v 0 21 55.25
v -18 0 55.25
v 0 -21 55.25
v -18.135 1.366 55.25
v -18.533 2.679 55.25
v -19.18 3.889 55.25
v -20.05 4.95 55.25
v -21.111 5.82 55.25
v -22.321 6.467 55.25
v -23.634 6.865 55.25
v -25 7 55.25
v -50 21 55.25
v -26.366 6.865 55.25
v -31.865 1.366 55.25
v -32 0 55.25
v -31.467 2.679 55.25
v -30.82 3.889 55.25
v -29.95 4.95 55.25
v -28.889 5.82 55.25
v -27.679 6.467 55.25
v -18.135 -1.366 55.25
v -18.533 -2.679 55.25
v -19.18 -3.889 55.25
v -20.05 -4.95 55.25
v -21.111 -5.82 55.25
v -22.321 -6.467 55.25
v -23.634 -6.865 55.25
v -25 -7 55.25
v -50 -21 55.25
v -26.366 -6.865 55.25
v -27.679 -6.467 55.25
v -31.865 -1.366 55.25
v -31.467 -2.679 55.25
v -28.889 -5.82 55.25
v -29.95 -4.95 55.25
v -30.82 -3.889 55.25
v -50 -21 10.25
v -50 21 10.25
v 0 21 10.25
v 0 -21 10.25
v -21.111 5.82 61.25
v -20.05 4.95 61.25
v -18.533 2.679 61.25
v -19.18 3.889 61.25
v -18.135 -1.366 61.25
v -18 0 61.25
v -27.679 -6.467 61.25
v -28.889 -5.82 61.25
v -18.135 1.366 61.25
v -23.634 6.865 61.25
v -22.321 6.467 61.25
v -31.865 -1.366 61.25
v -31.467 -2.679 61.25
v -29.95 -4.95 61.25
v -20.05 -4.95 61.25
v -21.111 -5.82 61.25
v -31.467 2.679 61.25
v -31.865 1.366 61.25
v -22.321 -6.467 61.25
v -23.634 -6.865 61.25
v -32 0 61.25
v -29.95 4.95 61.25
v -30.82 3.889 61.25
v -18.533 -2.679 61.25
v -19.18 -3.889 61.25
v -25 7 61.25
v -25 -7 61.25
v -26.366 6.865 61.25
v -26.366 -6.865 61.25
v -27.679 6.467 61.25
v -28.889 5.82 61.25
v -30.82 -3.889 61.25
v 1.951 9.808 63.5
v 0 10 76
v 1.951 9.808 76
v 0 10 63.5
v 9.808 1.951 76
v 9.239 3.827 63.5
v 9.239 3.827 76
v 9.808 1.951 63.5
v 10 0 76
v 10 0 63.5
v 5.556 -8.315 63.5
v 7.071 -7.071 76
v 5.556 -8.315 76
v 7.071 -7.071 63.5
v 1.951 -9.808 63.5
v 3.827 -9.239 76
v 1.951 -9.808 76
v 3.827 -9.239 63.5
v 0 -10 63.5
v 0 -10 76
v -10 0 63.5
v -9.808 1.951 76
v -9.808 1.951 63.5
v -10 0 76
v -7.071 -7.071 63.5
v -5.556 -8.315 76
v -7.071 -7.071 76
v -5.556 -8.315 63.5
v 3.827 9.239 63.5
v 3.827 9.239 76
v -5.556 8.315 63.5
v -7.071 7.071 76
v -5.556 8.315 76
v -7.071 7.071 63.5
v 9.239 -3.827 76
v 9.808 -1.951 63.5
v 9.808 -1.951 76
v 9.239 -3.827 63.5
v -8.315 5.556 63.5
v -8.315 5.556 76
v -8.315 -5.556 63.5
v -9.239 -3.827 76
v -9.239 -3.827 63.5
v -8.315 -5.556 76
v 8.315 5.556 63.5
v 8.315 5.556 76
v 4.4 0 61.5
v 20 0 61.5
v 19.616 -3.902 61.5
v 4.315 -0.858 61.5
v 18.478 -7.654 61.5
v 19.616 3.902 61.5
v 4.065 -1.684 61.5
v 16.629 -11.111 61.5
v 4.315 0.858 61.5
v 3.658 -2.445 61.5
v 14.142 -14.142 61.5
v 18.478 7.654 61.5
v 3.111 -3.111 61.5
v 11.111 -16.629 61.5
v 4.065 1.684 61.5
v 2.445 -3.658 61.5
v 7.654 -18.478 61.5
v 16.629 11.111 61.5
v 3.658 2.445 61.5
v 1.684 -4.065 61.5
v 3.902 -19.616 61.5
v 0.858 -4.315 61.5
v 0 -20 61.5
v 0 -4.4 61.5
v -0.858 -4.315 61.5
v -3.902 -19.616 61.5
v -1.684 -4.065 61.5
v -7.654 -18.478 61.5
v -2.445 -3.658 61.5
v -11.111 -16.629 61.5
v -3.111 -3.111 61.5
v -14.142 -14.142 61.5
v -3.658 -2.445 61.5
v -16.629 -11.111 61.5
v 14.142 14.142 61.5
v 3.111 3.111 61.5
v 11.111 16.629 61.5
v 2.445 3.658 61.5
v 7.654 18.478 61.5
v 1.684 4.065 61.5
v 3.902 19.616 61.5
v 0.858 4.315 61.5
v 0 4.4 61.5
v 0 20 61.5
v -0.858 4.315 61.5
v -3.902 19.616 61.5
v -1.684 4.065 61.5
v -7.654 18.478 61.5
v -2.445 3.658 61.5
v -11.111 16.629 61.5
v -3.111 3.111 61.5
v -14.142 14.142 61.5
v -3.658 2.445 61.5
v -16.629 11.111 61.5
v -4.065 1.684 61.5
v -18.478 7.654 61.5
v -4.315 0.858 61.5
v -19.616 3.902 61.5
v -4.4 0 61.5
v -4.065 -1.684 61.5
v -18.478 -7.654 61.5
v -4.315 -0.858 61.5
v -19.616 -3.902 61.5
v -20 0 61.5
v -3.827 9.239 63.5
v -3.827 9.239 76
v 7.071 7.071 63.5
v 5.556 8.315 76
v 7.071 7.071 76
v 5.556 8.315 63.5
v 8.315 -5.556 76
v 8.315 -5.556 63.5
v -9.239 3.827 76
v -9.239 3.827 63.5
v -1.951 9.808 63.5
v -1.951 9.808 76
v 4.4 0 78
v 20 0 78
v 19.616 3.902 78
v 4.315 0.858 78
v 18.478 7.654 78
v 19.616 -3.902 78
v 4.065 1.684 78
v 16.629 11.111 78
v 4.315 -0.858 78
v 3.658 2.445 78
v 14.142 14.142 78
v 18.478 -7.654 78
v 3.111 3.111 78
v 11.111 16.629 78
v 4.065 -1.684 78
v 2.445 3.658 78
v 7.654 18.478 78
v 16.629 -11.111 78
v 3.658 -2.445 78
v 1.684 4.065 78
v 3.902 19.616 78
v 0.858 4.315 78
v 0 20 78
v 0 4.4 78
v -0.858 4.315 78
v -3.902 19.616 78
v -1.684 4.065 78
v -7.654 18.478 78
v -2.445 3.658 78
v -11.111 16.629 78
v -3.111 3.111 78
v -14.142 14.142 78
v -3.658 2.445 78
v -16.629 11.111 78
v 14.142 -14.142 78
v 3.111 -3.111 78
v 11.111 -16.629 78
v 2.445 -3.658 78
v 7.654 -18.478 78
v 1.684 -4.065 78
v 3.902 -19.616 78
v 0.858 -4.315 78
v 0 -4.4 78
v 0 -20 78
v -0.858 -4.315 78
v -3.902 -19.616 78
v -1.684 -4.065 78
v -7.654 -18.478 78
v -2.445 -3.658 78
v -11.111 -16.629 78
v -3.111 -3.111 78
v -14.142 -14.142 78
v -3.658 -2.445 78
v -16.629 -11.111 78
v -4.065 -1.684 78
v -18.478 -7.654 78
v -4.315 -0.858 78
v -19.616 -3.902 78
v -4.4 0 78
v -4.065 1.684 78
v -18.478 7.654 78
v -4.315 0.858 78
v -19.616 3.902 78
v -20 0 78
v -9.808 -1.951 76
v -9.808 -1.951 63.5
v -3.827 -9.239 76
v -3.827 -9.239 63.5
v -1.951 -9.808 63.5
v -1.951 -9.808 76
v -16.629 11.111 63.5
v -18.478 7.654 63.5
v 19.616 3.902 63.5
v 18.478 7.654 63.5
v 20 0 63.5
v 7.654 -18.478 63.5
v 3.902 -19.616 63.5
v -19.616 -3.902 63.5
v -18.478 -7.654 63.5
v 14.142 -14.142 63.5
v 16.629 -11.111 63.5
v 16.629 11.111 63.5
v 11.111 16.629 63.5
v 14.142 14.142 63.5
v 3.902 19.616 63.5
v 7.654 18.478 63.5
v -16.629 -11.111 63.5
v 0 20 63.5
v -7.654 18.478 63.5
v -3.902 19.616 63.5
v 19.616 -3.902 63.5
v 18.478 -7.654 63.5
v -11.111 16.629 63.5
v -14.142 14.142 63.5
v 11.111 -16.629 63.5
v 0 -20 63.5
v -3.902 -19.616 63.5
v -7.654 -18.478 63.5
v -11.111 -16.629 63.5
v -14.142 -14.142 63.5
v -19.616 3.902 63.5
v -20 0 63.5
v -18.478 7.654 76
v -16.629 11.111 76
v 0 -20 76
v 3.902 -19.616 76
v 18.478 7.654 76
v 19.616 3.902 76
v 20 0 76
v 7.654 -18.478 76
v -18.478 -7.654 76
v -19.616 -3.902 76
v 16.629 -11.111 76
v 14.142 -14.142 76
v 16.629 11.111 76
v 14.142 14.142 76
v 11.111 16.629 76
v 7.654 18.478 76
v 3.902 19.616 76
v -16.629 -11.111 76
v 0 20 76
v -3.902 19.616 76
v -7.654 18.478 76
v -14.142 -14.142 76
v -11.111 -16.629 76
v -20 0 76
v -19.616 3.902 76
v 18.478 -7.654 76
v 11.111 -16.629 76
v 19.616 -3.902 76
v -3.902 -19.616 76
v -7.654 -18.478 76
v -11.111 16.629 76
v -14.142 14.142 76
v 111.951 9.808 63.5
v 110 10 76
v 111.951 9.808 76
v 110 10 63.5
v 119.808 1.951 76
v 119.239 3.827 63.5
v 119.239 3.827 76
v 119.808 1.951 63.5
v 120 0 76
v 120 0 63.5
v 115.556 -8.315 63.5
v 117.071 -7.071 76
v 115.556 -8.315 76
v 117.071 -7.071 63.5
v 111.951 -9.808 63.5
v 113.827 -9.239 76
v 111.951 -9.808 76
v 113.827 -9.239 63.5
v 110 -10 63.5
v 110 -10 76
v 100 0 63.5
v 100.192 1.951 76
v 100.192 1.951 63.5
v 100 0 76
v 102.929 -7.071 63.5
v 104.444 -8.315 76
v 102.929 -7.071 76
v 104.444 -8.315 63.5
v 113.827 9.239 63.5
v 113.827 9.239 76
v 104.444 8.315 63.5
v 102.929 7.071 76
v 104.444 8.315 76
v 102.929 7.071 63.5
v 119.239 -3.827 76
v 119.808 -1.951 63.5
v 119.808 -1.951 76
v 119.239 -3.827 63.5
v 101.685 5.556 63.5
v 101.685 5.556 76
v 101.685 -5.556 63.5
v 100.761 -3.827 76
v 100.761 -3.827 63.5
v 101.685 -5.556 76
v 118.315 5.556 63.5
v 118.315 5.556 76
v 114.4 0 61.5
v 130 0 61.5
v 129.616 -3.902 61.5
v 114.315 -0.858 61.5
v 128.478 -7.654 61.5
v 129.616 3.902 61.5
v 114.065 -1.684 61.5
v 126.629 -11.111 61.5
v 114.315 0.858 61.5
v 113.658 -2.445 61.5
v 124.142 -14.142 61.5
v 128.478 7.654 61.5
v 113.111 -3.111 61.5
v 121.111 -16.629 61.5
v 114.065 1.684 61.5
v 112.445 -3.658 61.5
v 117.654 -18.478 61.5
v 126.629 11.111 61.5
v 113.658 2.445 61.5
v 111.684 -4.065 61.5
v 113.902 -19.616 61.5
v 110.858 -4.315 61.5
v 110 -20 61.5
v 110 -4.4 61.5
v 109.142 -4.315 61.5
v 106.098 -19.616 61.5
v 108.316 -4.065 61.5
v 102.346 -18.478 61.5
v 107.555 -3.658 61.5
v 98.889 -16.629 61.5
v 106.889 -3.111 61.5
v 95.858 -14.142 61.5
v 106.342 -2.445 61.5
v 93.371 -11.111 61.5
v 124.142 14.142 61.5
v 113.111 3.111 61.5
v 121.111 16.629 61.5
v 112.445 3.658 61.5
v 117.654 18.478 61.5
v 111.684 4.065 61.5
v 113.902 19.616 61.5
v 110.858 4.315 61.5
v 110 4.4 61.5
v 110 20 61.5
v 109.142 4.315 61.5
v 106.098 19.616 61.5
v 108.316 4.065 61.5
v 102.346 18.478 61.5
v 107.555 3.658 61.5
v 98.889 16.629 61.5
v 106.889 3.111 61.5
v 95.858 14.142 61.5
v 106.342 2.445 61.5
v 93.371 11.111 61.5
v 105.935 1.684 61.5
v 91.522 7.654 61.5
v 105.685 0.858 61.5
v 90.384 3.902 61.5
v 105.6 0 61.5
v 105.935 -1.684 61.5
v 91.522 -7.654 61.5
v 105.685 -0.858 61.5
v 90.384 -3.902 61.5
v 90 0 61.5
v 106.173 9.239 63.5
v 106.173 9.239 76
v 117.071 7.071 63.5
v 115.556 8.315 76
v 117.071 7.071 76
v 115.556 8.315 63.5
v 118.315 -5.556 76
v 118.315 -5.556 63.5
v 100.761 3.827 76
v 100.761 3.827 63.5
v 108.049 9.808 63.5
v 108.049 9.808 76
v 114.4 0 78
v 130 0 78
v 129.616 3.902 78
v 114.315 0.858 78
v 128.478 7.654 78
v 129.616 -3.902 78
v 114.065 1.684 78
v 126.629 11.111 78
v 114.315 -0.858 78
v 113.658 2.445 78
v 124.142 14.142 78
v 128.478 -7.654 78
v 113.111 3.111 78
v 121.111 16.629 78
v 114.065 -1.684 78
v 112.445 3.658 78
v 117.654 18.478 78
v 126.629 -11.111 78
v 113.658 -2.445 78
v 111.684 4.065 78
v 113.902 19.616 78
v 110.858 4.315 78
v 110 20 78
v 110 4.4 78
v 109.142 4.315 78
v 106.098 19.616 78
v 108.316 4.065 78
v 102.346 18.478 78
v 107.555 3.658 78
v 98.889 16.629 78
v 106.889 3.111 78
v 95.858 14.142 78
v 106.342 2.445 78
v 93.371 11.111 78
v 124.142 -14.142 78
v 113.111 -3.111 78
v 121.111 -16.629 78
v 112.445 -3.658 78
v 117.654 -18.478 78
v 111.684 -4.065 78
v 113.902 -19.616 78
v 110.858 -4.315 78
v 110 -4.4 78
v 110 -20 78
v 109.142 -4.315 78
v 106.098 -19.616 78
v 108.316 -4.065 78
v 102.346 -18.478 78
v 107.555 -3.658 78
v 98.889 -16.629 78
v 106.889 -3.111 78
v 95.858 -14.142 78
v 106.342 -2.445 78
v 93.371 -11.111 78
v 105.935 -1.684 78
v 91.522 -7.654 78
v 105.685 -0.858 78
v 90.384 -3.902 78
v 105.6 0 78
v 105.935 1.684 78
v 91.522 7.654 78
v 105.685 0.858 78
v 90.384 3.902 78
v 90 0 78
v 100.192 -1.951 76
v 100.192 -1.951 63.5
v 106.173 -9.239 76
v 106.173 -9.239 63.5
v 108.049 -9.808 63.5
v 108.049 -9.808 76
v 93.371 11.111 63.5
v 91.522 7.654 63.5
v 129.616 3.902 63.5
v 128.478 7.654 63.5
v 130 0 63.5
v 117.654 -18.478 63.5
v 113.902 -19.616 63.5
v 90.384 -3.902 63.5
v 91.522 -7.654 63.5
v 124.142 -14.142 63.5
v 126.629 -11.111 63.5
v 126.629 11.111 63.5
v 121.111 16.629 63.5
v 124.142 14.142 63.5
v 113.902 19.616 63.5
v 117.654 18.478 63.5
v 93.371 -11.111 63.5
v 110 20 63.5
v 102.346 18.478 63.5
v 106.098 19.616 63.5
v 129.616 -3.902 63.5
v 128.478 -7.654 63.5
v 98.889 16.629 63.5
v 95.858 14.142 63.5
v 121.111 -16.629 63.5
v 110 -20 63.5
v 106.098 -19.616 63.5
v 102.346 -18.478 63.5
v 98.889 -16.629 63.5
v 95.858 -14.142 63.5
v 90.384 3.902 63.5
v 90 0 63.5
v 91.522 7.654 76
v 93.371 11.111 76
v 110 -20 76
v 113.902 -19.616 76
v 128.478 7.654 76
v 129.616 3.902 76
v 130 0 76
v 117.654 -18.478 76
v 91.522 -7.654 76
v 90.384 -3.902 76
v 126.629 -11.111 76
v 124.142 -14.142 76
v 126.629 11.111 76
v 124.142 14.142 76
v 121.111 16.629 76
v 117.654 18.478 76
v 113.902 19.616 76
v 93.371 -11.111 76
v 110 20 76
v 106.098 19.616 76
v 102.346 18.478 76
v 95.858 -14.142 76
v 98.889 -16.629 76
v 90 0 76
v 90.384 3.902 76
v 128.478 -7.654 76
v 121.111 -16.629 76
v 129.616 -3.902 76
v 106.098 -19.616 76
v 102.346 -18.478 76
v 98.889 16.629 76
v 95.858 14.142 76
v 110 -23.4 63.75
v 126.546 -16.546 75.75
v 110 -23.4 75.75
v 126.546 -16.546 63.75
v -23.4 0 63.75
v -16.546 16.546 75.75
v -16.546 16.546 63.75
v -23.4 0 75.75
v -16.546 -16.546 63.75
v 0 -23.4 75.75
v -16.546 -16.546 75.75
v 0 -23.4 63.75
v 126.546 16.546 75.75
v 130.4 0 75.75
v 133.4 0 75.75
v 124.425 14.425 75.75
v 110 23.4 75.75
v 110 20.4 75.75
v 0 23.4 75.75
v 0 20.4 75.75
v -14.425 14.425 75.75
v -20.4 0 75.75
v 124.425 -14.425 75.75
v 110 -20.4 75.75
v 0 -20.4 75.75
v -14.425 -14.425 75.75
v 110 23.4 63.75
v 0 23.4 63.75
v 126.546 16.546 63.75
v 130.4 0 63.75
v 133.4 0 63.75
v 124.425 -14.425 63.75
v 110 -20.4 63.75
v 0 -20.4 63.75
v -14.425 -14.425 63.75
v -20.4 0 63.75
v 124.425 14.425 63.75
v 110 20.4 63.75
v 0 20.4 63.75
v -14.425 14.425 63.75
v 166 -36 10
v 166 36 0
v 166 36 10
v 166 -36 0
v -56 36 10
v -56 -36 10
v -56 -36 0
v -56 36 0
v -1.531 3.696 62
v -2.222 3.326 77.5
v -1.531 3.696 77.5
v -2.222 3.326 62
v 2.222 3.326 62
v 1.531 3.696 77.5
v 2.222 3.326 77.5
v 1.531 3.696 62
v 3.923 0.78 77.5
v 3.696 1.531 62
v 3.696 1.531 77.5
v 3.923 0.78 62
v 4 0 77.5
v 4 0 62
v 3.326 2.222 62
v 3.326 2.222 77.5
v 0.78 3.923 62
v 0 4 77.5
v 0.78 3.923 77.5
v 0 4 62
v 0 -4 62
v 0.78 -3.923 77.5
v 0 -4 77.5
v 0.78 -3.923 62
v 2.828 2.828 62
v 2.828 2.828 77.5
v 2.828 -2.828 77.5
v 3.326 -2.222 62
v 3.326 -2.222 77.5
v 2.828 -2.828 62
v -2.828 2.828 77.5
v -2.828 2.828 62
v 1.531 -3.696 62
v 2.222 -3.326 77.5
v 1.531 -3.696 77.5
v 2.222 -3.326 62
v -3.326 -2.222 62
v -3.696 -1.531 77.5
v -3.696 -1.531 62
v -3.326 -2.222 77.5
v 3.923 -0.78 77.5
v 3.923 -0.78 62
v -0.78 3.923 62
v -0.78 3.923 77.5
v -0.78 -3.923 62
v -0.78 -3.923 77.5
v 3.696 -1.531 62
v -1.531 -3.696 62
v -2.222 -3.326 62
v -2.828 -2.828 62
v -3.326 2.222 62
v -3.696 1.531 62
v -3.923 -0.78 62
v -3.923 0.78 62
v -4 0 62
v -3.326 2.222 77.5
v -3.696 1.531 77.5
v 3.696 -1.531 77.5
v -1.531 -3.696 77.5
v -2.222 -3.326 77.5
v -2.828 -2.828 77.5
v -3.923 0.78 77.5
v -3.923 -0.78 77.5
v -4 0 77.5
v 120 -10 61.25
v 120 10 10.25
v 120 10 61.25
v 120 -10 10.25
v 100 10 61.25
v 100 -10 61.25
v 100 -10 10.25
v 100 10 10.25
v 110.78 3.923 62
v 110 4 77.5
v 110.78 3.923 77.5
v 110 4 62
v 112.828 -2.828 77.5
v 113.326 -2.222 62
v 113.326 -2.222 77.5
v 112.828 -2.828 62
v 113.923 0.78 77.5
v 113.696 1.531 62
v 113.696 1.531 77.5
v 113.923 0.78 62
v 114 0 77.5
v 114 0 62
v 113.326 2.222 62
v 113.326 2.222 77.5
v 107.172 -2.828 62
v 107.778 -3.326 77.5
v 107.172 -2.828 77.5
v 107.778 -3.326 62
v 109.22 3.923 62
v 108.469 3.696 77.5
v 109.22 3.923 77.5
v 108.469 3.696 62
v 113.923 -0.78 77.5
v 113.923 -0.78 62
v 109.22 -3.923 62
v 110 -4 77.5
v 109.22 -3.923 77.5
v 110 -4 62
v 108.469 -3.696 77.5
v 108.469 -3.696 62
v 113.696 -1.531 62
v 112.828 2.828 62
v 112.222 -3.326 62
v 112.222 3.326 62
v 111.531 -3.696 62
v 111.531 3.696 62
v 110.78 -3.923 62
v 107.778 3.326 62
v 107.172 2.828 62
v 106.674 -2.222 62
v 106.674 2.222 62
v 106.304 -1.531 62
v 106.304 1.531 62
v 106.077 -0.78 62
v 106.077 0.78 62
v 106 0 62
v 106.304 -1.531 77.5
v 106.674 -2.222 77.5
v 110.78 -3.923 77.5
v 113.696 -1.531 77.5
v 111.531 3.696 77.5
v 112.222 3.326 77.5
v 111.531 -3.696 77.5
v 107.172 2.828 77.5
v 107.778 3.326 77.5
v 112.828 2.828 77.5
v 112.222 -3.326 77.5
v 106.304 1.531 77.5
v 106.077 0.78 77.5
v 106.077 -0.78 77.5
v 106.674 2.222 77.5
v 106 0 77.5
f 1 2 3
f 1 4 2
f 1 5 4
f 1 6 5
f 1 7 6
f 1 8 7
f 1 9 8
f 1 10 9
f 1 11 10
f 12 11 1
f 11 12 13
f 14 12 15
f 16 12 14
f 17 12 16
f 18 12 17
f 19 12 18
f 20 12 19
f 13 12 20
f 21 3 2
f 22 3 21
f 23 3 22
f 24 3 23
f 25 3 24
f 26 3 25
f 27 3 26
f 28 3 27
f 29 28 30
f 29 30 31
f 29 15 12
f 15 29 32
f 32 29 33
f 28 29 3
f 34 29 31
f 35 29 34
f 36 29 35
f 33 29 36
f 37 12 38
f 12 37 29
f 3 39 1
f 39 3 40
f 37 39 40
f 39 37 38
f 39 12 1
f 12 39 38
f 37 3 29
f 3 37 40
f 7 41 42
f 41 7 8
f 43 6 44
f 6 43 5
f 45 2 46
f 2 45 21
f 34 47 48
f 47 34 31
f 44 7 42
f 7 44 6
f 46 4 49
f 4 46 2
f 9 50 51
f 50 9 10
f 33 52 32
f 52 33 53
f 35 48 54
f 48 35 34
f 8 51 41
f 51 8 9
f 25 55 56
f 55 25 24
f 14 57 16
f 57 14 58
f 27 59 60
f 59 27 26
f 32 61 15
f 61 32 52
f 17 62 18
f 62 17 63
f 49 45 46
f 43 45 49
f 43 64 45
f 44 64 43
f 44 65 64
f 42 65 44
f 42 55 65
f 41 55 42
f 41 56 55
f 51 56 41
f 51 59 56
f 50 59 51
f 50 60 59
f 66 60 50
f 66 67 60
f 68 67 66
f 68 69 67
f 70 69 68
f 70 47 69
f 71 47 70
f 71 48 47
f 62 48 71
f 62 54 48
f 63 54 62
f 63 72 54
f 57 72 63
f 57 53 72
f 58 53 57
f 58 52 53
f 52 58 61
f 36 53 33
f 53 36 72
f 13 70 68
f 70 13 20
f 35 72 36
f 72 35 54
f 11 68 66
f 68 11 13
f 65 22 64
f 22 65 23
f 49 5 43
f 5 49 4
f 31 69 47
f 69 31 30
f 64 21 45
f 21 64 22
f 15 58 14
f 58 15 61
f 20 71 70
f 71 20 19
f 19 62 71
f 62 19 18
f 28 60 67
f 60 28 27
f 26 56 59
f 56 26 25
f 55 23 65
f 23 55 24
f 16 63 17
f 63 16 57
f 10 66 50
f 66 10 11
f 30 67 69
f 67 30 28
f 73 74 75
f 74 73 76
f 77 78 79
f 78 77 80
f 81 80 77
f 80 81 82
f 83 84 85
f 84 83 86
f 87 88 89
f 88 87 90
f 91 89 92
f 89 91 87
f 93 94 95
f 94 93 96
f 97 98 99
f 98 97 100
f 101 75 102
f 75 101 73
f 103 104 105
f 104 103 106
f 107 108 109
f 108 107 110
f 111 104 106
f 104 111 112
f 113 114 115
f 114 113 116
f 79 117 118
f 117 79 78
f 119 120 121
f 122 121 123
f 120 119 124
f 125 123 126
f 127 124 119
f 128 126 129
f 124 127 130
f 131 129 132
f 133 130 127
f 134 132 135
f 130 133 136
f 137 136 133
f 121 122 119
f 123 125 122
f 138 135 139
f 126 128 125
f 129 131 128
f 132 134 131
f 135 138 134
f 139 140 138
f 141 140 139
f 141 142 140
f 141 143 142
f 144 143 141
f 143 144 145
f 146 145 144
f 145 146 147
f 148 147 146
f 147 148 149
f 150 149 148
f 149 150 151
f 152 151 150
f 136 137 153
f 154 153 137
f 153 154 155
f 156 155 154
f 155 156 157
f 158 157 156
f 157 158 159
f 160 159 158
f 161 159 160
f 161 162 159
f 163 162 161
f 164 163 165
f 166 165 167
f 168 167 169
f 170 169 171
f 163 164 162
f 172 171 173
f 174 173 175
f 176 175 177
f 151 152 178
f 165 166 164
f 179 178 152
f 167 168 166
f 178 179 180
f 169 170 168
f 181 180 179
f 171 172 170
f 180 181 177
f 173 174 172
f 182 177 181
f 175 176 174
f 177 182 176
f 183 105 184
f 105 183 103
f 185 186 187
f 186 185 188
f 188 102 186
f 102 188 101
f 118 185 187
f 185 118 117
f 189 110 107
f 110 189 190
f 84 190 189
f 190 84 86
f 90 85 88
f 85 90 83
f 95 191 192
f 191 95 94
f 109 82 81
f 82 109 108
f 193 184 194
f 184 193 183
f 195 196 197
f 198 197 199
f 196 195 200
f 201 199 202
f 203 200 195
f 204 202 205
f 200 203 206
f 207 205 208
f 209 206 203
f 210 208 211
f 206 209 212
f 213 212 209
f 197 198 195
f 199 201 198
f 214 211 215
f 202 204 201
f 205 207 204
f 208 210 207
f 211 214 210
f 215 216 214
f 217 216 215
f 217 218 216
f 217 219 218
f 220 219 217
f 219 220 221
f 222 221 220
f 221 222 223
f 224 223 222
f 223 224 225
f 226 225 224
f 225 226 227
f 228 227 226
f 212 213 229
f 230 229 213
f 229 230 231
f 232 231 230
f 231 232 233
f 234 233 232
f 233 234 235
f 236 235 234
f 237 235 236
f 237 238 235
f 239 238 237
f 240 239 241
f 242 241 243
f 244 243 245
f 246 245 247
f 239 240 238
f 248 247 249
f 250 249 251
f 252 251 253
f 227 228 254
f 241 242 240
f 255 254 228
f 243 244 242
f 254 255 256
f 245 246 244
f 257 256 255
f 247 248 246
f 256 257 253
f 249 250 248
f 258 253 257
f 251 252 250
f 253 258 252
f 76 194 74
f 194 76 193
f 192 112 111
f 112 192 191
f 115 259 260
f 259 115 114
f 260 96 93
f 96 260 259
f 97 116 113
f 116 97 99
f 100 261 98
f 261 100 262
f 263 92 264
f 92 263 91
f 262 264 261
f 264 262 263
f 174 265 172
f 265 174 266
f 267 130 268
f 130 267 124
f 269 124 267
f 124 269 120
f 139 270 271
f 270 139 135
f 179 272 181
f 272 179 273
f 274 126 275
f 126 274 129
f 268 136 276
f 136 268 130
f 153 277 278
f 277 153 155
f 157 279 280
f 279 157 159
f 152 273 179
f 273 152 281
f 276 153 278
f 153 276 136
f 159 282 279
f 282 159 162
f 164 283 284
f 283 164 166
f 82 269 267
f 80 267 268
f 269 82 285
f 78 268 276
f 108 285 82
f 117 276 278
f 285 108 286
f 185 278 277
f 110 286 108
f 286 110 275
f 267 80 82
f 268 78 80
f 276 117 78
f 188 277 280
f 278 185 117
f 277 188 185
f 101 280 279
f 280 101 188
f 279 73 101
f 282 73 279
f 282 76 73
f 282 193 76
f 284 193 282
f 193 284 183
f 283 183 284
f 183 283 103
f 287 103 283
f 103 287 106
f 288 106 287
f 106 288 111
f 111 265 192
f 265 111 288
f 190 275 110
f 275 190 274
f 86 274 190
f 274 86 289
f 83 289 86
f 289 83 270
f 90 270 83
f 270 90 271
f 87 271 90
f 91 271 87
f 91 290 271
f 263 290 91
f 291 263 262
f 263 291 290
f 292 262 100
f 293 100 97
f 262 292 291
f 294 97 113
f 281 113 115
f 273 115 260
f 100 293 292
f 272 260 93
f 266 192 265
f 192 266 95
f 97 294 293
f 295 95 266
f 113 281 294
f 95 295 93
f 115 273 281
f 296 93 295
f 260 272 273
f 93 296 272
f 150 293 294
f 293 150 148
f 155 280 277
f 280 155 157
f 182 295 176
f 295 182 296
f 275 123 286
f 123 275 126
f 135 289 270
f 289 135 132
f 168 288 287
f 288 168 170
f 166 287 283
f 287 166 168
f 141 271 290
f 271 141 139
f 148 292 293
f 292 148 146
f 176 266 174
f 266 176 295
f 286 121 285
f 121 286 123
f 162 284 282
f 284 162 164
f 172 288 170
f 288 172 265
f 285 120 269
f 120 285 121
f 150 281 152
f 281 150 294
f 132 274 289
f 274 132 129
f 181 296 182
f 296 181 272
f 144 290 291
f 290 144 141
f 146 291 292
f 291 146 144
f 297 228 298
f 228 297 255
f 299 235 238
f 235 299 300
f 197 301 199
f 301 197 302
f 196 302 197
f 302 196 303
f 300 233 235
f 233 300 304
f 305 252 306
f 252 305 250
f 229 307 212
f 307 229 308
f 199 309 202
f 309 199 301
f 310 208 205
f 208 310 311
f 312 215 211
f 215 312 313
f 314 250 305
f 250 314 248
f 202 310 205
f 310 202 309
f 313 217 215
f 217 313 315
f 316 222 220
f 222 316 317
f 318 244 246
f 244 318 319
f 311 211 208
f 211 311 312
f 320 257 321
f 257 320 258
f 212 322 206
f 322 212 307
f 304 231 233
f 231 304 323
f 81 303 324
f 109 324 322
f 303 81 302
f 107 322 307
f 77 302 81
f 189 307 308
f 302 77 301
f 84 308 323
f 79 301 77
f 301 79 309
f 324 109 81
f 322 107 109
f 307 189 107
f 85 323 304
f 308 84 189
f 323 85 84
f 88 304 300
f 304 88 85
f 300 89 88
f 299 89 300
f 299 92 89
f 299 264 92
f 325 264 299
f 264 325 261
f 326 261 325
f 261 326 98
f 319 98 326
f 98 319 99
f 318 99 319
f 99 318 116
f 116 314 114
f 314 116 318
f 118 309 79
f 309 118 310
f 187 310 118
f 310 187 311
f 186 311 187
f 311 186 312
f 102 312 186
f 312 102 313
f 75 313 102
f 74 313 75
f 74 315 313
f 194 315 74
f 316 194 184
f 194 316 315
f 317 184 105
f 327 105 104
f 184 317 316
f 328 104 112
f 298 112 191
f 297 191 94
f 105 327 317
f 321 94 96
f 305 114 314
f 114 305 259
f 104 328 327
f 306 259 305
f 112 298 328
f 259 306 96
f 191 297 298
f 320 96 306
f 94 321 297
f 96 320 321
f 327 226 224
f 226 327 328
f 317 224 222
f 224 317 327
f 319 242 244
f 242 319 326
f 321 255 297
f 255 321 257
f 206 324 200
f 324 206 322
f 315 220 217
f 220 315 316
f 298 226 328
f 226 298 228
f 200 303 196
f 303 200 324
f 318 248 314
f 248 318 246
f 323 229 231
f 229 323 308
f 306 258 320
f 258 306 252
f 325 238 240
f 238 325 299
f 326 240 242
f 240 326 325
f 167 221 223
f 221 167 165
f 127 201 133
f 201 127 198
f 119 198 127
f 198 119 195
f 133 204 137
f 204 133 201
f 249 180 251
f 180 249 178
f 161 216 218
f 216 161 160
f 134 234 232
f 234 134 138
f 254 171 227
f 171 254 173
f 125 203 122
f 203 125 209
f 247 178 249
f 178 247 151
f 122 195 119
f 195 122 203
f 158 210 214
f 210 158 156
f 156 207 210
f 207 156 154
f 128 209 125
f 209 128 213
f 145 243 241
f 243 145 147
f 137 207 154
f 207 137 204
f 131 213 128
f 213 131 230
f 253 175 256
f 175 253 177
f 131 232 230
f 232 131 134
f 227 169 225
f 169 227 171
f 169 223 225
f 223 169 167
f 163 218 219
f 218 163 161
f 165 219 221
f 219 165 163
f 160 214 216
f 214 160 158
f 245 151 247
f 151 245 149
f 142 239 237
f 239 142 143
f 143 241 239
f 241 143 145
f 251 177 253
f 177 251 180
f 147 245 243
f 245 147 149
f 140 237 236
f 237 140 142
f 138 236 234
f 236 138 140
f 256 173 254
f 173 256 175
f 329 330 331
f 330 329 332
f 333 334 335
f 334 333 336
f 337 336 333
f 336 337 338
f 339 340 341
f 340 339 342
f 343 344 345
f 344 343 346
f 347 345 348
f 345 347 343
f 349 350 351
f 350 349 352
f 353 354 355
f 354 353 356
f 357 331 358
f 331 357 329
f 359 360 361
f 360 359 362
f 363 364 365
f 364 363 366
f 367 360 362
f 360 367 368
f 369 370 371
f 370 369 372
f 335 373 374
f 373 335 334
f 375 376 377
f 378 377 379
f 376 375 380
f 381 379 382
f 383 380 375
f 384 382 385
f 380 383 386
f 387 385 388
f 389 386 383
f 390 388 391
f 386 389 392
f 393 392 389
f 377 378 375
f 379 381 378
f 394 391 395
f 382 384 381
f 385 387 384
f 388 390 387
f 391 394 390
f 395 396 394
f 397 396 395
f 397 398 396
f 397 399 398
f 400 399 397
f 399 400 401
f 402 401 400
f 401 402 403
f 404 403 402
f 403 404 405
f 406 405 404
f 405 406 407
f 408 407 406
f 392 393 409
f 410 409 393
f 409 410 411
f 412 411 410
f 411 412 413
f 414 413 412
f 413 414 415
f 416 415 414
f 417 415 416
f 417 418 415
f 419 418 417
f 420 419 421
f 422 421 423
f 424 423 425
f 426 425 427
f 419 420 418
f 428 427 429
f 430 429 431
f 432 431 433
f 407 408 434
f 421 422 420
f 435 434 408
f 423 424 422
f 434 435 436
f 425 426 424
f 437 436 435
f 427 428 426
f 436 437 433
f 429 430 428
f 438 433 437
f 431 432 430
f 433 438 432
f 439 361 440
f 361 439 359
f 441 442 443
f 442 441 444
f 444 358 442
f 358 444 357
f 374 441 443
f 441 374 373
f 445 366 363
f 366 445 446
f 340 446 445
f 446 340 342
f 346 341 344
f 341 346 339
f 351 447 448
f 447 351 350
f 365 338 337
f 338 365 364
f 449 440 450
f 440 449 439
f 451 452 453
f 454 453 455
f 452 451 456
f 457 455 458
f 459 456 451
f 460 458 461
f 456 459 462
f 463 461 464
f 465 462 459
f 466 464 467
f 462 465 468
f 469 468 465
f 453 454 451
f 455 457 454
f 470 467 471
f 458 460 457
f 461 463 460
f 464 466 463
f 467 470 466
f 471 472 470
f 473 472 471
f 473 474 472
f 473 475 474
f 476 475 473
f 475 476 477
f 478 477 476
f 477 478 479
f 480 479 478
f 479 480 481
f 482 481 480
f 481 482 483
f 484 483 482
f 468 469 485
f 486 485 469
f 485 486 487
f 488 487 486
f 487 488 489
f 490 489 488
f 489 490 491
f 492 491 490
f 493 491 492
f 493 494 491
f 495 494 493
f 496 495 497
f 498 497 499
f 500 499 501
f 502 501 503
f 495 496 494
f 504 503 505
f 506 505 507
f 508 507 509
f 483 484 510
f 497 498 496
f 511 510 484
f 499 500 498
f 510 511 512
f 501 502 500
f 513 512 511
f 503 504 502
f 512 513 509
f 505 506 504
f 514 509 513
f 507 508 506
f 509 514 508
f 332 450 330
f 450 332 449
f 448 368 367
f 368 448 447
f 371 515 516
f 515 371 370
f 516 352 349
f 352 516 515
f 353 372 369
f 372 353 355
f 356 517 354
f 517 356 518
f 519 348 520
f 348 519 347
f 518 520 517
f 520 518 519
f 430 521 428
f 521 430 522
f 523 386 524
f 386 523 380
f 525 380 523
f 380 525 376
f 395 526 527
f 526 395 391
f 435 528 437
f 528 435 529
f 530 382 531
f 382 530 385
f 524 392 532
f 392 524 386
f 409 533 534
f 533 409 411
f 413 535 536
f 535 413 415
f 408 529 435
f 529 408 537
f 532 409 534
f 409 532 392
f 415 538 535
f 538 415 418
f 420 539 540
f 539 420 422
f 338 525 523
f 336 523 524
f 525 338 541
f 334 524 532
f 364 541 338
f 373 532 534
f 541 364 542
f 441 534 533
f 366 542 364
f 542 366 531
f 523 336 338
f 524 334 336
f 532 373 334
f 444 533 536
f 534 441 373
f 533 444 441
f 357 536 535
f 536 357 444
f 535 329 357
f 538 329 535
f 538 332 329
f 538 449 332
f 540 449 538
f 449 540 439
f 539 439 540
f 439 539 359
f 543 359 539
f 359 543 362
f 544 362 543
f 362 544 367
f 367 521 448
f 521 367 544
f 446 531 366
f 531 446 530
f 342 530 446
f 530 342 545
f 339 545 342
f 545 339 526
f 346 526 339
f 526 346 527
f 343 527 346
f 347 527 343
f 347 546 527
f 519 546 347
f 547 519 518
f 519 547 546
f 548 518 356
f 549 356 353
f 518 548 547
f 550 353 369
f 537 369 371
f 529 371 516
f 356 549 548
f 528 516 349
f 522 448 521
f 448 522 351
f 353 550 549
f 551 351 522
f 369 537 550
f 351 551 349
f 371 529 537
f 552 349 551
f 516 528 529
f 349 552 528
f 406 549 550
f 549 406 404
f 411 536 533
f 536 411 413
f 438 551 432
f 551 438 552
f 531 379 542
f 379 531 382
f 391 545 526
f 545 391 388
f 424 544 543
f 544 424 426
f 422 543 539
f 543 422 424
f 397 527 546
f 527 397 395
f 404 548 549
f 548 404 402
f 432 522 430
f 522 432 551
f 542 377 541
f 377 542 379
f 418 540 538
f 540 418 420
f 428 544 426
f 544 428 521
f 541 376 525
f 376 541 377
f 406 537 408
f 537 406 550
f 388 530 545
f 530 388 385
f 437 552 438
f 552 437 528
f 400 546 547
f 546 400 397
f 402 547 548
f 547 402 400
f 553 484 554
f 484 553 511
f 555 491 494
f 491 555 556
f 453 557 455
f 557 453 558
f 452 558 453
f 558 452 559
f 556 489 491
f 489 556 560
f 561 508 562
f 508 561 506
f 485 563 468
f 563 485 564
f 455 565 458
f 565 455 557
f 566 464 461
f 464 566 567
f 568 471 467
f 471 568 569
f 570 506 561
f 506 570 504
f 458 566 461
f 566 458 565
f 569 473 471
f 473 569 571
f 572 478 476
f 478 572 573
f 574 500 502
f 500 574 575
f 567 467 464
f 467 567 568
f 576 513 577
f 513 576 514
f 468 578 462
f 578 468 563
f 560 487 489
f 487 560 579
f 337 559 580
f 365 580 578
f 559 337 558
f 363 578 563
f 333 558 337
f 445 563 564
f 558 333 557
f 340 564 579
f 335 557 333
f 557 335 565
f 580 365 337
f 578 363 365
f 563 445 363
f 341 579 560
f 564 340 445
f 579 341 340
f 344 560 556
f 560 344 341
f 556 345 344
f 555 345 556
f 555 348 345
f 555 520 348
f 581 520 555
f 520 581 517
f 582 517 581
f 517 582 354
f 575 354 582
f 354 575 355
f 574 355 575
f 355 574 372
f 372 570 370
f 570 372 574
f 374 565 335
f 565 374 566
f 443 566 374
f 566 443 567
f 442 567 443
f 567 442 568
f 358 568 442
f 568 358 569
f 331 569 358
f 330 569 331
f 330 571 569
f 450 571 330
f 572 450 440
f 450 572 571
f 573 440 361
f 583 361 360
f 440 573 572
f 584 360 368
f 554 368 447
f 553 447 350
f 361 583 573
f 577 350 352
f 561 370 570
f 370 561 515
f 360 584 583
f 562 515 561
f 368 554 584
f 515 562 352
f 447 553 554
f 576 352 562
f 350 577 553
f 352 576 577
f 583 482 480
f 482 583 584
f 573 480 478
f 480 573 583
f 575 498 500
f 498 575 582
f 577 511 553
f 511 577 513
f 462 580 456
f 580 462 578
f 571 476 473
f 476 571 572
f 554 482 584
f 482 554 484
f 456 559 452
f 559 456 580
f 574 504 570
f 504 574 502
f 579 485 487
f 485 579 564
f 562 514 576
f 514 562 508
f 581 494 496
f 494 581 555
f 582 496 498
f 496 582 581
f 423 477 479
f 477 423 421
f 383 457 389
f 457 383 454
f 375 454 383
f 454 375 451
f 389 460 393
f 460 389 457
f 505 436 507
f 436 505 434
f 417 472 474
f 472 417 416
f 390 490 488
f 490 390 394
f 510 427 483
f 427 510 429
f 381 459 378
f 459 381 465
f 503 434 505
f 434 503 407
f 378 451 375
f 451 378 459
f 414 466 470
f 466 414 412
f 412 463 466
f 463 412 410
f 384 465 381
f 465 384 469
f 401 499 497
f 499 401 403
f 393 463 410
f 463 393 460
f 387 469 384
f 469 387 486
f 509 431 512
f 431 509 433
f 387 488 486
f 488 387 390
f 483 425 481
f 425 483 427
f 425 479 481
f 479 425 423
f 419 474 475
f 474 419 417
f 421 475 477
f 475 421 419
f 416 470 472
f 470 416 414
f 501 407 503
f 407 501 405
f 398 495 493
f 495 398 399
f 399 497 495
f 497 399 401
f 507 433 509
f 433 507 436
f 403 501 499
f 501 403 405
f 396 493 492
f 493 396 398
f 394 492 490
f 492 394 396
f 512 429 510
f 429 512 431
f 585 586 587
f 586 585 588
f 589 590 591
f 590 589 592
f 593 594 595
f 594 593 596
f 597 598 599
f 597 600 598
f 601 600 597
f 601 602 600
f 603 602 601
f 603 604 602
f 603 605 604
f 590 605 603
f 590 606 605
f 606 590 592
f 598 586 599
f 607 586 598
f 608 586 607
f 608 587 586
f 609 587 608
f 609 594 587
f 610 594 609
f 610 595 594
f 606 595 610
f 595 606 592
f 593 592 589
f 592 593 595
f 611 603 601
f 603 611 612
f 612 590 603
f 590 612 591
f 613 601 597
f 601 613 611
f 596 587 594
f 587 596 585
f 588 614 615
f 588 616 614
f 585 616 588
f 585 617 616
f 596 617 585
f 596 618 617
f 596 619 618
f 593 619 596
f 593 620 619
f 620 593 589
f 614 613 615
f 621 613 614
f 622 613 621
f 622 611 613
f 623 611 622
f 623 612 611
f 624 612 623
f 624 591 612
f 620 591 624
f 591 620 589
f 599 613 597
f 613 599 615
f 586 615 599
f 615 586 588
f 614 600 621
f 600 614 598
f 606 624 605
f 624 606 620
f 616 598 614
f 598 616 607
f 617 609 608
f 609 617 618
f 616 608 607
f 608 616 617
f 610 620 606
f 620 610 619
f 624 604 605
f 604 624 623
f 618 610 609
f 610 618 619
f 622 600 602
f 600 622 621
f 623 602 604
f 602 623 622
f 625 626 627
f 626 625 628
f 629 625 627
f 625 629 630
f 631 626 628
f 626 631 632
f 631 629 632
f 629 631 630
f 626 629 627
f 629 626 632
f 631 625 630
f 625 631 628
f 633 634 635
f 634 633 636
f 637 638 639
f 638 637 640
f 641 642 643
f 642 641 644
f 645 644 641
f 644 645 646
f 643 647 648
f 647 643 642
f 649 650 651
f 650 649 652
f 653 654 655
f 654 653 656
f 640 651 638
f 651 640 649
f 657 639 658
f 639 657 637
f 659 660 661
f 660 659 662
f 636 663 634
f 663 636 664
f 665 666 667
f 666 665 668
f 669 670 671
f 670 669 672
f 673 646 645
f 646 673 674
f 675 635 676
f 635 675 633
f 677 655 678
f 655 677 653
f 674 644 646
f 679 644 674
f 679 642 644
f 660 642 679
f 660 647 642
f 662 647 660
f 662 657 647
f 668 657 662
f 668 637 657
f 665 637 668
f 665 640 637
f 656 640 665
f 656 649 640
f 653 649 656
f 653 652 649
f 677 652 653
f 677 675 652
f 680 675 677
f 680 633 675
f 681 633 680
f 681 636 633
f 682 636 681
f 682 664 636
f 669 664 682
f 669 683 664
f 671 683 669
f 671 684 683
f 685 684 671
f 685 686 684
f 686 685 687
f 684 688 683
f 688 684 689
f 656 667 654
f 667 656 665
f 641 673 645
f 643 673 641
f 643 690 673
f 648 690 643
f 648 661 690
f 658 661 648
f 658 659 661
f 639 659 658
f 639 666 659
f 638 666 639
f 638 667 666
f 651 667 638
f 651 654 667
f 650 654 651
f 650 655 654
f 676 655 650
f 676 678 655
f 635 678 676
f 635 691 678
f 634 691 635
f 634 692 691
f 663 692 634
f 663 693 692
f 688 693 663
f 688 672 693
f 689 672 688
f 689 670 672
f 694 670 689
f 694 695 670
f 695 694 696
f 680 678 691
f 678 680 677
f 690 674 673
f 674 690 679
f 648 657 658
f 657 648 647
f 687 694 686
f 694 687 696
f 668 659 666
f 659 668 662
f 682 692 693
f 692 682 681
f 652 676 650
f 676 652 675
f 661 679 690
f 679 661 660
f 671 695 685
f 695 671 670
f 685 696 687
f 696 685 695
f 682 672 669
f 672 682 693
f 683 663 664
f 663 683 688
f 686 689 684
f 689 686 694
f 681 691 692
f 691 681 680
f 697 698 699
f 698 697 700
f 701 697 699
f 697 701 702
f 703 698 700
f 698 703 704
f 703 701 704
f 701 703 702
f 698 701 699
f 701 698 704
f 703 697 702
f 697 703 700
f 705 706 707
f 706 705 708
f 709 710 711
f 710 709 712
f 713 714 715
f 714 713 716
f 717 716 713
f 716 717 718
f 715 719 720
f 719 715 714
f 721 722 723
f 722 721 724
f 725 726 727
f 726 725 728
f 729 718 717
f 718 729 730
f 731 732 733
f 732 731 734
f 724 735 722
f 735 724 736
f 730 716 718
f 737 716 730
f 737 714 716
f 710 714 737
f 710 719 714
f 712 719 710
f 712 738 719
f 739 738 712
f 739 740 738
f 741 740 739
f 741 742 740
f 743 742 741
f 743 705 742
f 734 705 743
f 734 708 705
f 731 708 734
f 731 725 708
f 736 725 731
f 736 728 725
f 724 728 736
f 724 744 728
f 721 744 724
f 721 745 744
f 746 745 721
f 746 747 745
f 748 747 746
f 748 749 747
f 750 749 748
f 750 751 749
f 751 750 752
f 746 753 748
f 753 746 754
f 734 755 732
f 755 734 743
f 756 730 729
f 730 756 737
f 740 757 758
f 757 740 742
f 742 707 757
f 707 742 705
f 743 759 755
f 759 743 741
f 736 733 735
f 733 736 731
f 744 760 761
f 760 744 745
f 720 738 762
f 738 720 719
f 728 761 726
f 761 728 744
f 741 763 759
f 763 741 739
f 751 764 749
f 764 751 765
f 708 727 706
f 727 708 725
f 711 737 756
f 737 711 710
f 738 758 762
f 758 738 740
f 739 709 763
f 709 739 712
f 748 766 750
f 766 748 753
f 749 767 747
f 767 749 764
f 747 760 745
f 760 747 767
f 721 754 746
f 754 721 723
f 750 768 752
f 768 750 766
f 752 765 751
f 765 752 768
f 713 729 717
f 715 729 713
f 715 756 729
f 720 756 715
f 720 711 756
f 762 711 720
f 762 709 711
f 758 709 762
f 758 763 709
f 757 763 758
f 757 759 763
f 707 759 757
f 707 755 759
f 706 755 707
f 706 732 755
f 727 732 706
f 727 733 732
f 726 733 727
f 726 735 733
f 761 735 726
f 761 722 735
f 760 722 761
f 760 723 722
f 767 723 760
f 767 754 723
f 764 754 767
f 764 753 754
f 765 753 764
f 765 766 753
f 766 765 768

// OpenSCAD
$fn = 32;

// ------------------------------------------------------------------------
// Motor belt drive: span 110 mm, pulleys d40, belt 12 mm wide
// Every part is its own module, assembly() places every instance.
// ------------------------------------------------------------------------

// --- part 1 ---
module base_plate() {
  difference() {
    translate([-111, -36, 0]) cube([222, 72, 10]);
  }
}

// --- part 2 ---
module motor() {
  union() {
    translate([-22.5, -21, 0]) cube([45, 42, 50]);
    translate([25.5, 0, 25]) rotate([0, 90, 0]) cylinder(h = 6, d = 14, center = true);
  }
}

// --- part 3 ---
module drive_shaft() {
  translate([0, 0, -7.75]) cylinder(h = 15.5, d = 8);
}

// --- part 4 ---
module pulley_drive() {
  difference() {
    union() {
      cylinder(h = 16.5, d = 20);
      cylinder(h = 2, d = 40);
      translate([0, 0, 14.5]) cylinder(h = 2, d = 40);
    }
    translate([0, 0, -1]) cylinder(h = 18.5, d = 8.8);
  }
}

// --- part 5 ---
module idler_post() {
  translate([-10, -10, 0]) cube([20, 20, 51]);
}

// --- part 6 ---
module driven_shaft() {
  translate([0, 0, -7.75]) cylinder(h = 15.5, d = 8);
}

// --- part 7 ---
module pulley_driven() {
  difference() {
    union() {
      cylinder(h = 16.5, d = 20);
      cylinder(h = 2, d = 40);
      translate([0, 0, 14.5]) cylinder(h = 2, d = 40);
    }
    translate([0, 0, -1]) cylinder(h = 18.5, d = 8.8);
  }
}

// --- part 8 ---
module drive_belt() {
  difference() {
    linear_extrude(height = 12) polygon(points = concat([for (a = [90 : 45 : 270]) [23.4 * cos(a), 23.4 * sin(a)]], [for (a = [270 : 45 : 450]) [110 + 23.4 * cos(a), 23.4 * sin(a)]]));
    translate([0, 0, -1]) linear_extrude(height = 14) polygon(points = concat([for (a = [90 : 45 : 270]) [20.4 * cos(a), 20.4 * sin(a)]], [for (a = [270 : 45 : 450]) [110 + 20.4 * cos(a), 20.4 * sin(a)]]));
  }
}

// --- assembly ---
module assembly() {
  color([0.80, 0.24, 0.20]) translate([55, 0, 0]) rotate([0, 0, 0]) base_plate();
  color([0.20, 0.45, 0.75]) translate([0, 0, 32.75]) rotate([0, 270, 0]) motor();
  color([0.25, 0.62, 0.32]) translate([0, 0, 69.75]) rotate([0, 0, 0]) drive_shaft();
  color([0.92, 0.70, 0.18]) translate([0, 0, 61.5]) rotate([0, 0, 0]) pulley_drive();
  color([0.58, 0.35, 0.70]) translate([110, 0, 10.25]) rotate([0, 0, 0]) idler_post();
  color([0.16, 0.66, 0.66]) translate([110, 0, 69.75]) rotate([0, 0, 0]) driven_shaft();
  color([0.85, 0.48, 0.18]) translate([110, 0, 61.5]) rotate([0, 0, 0]) pulley_driven();
  color([0.55, 0.60, 0.65]) translate([0, 0, 63.75]) rotate([0, 0, 0]) drive_belt();
}

assembly();
